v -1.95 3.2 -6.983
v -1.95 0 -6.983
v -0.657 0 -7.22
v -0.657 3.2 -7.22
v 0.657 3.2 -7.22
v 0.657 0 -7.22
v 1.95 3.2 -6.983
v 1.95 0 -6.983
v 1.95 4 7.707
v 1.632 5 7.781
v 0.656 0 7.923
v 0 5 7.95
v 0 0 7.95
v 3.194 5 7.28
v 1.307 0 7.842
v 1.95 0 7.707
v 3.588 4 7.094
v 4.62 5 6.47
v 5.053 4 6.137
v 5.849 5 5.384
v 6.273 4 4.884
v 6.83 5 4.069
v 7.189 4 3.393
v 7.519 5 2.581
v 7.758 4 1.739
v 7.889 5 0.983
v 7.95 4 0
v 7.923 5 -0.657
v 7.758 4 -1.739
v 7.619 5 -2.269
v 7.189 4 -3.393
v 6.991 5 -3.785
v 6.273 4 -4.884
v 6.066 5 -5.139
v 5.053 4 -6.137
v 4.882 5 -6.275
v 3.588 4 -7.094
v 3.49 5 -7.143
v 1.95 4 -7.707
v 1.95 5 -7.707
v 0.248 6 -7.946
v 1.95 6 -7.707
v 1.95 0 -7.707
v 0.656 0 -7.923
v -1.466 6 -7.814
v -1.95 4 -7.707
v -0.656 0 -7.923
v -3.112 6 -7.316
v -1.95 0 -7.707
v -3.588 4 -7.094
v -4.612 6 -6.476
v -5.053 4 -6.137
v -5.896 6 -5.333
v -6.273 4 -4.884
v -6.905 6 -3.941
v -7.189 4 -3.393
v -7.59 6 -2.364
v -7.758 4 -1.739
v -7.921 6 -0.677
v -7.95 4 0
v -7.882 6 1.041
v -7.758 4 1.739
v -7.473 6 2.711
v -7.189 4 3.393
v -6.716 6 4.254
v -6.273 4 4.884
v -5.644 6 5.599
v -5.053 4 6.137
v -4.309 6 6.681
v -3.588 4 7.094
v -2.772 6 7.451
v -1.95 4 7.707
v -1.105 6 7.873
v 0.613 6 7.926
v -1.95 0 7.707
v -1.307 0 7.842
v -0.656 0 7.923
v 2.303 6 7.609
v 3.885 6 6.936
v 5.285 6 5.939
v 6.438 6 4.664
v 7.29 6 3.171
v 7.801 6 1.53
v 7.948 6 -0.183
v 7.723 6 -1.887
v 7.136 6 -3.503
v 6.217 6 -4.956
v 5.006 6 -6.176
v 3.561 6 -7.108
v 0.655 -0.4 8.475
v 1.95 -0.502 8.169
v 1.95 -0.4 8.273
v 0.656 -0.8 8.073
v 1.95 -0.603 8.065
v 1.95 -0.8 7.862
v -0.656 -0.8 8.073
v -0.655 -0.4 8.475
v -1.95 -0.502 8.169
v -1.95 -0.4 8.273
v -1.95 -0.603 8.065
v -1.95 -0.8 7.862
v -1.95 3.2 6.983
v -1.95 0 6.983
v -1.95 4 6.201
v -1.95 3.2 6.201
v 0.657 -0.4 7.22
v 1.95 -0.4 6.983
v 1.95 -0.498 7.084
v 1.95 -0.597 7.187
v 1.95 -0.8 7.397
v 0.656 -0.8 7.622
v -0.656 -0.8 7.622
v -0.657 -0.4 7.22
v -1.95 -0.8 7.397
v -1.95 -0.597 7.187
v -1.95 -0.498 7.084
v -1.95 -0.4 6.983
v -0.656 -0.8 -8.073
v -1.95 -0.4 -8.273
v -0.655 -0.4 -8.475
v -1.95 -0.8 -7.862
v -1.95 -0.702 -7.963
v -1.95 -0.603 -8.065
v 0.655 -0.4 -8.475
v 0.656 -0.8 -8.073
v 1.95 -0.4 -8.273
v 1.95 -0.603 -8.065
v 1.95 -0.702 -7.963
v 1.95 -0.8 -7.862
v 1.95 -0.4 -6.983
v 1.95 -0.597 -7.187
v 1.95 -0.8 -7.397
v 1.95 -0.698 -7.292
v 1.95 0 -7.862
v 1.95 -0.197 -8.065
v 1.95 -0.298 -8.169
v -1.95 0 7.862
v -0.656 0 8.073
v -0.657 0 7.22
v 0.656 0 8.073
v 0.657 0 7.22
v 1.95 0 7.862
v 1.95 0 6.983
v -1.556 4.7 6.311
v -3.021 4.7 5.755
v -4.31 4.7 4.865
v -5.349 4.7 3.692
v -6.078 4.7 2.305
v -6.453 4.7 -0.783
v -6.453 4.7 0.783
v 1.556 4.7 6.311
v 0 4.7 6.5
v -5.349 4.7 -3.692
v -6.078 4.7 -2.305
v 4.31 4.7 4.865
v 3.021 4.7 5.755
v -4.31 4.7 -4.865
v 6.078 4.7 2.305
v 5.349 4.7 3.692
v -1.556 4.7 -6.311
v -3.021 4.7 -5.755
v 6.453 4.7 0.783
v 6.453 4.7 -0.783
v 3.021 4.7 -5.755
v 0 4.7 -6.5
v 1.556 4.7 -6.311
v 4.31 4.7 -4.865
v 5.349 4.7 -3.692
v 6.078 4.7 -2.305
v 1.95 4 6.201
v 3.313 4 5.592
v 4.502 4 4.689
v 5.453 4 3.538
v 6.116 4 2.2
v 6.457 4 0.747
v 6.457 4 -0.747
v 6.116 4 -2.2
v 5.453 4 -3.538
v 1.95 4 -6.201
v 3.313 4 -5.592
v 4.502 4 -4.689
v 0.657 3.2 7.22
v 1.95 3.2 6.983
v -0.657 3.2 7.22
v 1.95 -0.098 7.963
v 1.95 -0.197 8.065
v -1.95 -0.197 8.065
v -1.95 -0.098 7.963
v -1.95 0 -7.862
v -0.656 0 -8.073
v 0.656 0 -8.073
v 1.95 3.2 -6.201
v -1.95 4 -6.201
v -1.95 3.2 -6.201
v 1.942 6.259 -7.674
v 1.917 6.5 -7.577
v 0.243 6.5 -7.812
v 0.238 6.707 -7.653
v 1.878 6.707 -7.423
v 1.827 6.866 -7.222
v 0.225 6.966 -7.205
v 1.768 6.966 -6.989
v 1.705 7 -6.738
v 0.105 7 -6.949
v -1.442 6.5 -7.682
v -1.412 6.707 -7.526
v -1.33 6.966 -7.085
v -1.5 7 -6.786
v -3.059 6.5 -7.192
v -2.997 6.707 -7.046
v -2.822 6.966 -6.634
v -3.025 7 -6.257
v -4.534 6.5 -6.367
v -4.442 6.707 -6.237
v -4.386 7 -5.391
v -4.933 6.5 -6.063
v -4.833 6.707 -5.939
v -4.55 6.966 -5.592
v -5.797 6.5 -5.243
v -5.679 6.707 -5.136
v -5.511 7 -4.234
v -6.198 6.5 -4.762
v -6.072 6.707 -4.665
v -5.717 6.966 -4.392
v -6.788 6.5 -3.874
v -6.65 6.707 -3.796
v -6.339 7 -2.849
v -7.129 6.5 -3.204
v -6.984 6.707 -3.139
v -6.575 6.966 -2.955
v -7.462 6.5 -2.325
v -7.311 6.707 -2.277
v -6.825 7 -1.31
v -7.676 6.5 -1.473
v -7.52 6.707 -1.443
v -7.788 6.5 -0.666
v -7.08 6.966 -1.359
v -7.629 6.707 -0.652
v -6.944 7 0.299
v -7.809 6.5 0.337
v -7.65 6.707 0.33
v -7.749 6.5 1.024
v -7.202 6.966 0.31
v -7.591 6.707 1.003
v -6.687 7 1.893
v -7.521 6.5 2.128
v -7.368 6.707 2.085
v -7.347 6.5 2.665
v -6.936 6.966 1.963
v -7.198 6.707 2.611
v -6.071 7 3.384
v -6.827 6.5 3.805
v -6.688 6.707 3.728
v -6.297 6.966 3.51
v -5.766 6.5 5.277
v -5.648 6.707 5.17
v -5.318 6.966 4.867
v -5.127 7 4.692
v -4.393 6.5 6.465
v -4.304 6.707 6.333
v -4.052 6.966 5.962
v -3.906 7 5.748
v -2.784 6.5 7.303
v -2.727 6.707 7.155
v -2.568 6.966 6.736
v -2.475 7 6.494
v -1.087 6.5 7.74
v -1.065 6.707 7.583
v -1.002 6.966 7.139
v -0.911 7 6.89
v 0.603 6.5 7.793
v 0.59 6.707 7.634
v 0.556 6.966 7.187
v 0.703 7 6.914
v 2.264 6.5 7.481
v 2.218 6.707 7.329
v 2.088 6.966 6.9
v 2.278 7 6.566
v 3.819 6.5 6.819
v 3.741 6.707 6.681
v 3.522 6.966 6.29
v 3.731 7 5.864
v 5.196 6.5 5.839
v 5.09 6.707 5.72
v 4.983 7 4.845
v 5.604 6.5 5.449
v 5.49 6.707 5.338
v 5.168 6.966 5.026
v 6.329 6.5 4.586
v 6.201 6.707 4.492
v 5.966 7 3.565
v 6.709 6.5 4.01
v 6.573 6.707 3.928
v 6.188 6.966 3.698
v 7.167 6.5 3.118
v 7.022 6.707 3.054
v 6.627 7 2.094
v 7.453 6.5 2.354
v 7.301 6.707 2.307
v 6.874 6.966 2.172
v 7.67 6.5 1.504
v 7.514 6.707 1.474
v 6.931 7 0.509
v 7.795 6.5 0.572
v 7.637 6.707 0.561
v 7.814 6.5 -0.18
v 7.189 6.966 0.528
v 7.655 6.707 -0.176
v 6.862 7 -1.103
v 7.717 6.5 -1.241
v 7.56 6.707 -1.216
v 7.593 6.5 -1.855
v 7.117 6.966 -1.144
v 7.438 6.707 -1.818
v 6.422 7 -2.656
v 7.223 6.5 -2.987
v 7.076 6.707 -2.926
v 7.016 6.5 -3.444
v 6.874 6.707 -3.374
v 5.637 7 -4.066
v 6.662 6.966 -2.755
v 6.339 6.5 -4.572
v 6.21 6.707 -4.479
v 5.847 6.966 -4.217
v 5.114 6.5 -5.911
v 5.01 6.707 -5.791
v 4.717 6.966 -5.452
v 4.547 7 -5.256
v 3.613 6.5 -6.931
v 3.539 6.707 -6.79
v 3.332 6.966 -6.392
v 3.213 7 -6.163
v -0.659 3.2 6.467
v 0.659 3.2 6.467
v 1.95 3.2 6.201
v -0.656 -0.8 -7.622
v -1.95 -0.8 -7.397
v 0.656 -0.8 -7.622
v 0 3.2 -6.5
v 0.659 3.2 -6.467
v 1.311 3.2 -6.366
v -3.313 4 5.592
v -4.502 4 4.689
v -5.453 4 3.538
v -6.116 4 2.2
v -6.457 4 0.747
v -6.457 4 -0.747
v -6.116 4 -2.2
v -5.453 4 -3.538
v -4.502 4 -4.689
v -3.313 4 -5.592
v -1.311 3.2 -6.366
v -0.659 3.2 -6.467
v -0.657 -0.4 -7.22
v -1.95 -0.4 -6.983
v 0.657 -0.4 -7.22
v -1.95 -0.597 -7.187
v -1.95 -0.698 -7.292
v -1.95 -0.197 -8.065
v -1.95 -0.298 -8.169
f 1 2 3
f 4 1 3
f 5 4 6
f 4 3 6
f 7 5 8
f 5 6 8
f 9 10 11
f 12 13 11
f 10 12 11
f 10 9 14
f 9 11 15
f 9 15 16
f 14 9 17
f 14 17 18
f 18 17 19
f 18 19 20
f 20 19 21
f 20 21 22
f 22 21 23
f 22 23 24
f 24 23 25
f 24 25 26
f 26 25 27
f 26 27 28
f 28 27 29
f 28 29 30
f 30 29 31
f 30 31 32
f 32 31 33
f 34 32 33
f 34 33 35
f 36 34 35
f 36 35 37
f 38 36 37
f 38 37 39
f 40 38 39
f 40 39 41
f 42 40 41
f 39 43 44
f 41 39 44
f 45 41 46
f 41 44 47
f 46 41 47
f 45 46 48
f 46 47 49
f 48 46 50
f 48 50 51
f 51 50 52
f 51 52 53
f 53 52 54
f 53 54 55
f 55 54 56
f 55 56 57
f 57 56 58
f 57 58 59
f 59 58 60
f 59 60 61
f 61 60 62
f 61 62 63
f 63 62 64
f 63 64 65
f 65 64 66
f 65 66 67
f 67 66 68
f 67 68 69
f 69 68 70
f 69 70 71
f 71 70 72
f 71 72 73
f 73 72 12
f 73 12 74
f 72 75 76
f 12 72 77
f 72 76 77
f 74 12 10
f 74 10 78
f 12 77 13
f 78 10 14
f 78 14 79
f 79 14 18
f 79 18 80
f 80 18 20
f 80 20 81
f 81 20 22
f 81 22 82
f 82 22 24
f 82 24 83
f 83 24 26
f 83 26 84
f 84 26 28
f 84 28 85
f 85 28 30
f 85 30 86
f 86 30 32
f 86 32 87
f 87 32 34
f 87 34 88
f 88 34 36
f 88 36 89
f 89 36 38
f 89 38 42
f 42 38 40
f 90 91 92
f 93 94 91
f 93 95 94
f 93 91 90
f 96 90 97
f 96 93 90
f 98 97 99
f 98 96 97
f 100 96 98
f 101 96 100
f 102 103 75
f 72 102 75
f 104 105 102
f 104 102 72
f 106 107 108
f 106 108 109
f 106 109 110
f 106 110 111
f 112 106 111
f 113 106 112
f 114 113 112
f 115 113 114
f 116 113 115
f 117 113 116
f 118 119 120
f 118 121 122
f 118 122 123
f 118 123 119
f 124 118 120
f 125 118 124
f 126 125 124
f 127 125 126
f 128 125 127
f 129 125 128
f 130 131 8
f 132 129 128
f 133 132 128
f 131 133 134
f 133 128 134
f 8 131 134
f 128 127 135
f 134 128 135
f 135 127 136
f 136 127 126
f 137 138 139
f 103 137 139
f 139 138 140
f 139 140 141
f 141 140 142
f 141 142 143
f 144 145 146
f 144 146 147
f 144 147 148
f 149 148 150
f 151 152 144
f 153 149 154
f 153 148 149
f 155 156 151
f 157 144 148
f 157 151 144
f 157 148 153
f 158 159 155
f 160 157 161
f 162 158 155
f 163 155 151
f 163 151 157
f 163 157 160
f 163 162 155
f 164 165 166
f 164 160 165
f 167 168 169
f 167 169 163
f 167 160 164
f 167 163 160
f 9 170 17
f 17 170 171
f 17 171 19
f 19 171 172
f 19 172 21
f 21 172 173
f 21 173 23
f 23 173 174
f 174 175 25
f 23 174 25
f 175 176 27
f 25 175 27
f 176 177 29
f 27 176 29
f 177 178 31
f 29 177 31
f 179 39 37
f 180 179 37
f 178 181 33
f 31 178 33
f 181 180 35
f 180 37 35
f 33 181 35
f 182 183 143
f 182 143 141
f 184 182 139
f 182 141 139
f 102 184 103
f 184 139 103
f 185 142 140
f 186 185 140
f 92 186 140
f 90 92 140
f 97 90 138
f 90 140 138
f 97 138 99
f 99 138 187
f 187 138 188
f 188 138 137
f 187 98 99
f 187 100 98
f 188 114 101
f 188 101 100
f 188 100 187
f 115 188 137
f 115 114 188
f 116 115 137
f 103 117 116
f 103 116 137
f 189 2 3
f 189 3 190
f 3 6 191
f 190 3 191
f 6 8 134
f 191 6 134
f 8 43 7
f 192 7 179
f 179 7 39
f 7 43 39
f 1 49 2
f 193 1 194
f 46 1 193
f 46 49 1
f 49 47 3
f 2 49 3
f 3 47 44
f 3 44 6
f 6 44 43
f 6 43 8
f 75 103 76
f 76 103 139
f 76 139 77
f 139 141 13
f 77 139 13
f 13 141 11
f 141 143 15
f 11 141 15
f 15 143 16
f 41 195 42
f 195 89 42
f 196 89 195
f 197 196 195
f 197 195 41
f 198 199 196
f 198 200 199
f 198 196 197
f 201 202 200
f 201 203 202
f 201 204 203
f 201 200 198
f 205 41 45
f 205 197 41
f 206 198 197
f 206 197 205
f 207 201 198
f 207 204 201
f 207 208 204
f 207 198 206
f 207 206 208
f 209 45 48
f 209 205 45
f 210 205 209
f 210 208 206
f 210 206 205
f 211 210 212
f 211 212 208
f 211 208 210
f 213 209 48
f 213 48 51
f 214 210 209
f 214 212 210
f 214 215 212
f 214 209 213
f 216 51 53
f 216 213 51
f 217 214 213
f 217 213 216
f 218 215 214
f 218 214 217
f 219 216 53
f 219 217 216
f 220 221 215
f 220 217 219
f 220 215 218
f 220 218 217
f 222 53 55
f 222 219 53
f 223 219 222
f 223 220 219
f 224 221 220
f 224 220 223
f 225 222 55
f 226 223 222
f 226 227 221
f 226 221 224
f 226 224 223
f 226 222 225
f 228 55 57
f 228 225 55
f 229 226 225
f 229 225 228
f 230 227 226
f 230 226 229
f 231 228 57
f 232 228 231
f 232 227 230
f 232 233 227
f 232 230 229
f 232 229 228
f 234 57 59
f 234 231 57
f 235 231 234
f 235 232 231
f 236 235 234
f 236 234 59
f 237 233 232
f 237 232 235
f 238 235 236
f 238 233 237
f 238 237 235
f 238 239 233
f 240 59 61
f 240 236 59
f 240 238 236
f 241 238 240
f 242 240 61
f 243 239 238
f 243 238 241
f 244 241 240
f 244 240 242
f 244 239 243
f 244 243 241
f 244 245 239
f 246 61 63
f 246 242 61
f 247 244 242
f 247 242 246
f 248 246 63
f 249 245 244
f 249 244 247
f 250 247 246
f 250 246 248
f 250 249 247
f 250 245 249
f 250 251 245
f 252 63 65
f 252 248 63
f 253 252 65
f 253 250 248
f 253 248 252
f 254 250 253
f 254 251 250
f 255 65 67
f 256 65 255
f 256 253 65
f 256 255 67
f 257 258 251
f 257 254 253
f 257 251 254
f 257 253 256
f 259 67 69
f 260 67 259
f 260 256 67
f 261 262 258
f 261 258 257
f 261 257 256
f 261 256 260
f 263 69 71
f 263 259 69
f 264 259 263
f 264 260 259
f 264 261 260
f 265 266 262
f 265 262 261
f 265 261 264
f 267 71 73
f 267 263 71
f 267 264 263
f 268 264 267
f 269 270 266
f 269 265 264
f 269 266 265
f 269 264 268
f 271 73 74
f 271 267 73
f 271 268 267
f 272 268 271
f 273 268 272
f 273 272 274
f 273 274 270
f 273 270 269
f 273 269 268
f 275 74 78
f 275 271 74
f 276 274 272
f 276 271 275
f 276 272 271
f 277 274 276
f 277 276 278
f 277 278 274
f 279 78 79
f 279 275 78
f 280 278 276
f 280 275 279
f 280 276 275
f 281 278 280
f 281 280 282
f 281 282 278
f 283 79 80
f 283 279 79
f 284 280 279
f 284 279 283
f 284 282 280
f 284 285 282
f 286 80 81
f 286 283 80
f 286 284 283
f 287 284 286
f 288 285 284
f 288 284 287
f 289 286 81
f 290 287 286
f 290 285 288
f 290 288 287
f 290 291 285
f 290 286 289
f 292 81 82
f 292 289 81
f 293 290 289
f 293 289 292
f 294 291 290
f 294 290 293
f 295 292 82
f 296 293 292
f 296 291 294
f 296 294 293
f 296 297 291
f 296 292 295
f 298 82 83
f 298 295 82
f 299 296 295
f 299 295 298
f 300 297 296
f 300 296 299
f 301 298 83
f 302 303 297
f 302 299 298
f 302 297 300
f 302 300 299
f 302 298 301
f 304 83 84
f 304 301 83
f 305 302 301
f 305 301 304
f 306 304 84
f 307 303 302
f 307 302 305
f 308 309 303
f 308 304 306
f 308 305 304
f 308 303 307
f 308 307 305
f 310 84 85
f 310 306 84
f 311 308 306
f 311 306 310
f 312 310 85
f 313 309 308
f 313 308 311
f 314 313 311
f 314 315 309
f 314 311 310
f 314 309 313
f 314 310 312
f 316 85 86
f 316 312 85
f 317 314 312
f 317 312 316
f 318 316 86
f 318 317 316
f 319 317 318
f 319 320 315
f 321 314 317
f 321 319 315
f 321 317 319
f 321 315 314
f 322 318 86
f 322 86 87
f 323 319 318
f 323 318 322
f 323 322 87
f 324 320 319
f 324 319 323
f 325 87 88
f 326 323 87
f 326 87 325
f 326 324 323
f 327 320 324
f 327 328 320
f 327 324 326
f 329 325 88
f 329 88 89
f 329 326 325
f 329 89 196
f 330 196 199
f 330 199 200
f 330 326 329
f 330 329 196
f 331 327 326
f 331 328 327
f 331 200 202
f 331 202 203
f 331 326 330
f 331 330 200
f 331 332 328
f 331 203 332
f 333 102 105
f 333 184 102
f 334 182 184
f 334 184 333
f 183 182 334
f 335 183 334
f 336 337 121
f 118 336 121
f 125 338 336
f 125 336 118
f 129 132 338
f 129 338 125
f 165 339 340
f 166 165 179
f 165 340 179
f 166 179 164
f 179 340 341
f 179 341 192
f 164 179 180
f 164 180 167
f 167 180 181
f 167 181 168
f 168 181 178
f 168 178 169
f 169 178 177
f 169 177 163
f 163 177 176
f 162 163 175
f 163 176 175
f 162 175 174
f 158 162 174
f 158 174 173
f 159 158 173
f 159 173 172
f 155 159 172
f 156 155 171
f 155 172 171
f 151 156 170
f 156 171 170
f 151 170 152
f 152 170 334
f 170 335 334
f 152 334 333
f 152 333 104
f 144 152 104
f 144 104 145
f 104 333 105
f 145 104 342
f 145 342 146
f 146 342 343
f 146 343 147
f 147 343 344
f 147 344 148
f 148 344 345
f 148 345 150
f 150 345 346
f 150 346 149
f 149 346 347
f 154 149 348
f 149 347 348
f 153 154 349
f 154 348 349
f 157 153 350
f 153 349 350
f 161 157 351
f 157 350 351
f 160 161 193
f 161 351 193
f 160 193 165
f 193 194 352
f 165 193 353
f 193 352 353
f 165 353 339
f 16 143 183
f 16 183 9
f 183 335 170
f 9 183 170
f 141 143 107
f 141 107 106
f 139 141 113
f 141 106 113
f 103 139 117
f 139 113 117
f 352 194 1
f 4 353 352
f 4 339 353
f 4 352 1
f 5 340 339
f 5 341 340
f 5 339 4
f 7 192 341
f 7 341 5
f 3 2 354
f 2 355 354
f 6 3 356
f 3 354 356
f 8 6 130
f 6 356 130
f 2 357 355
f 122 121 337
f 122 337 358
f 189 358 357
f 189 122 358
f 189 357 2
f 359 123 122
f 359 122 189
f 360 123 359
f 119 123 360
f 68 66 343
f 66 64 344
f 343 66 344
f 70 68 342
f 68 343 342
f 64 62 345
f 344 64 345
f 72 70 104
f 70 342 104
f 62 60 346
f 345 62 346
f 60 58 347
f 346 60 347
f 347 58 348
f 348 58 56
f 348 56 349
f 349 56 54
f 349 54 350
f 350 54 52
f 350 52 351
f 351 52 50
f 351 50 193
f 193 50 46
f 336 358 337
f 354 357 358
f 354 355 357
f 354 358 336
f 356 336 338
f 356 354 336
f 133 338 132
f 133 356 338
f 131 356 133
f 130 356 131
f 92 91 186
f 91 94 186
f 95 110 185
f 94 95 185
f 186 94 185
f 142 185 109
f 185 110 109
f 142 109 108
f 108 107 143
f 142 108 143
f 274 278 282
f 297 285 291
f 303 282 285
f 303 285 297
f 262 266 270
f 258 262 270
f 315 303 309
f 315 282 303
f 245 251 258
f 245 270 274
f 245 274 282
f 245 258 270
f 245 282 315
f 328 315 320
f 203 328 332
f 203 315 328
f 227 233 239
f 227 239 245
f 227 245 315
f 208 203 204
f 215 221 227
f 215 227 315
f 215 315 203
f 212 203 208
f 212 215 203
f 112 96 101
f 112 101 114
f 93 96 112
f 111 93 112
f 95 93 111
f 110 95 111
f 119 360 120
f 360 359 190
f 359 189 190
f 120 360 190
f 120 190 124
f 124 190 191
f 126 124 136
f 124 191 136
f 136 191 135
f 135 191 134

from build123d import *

# Parameters (mm, degrees)
SKETCH_2_R               = 7.95
EXTRUDE_1_DEPTH          = 5
SKETCH_4_R               = 8.5
EXTRUDE_2_DEPTH          = 0.8
SKETCH_3_R               = 7.25
CUT_EXTRUDE_2_DEPTH      = 4
CHAMFER_2_SIZE           = 0.4
CUT_EXTRUDE_3_DEPTH      = 14.019216566
CUT_EXTRUDE_3_DEPTH_BACK = 14.019216566
SKETCH_5_W               = 6
SKETCH_5_H               = 8
SKETCH_6_R               = 7.95
EXTRUDE_3_DEPTH          = 2
FILLET_1_R               = 1
SKETCH_7_R               = 6.5
CUT_EXTRUDE_4_DEPTH      = 1.5
CUT_EXTRUDE_8_DEPTH      = 14.910427743
CUT_EXTRUDE_8_DEPTH_BACK = 14.910427743
SKETCH_9_W               = 2.014745723
SKETCH_9_H               = 2.313226571
SKETCH_9_W_2             = 1.942835104
SKETCH_9_H_2             = 2.895732504


with BuildPart() as part:
    # 草图2 → 凸台-拉伸1 (new body)
    with BuildSketch(Plane(origin=(0, 0, 0), x_dir=(1, 0, 0), z_dir=(0, 1, 0))):
        with Locations(Location((0, 0, 0), (0, 0, 270))):
            Circle(SKETCH_2_R)
    extrude(amount=EXTRUDE_1_DEPTH)


with BuildPart() as body_2:
    # 草图4 → 凸台-拉伸2 (new body)
    with BuildSketch(Plane.XZ):
        with Locations(Location((0, 0, 0), (0, 0, 270))):
            Circle(SKETCH_4_R)
    extrude(amount=EXTRUDE_2_DEPTH)


with BuildPart() as cut_extrude_2_tool:
    # 草图3 → 切除-拉伸2 (new body)
    with BuildSketch(Plane.XZ.offset(0.8)):
        with Locations(Location((0, 0, 0), (0, 0, 270))):
            Circle(SKETCH_3_R)
    extrude(amount=-CUT_EXTRUDE_2_DEPTH)


with BuildPart() as part_1:
    add(part.part)

    # 切除-拉伸2: cut by cut_extrude_2_tool
    add(cut_extrude_2_tool.part, mode=Mode.SUBTRACT)


with BuildPart() as body_2_1:
    add(body_2.part)

    # 切除-拉伸2: cut by cut_extrude_2_tool
    add(cut_extrude_2_tool.part, mode=Mode.SUBTRACT)

    # 倒角2
    # the kernel refuses this chamfer: 0.4 mm, written as the material it takes off along each edge
    with BuildSketch(Plane(origin=(0, 0, 0), x_dir=(0, 0, -1), z_dir=(-1, 0, 0))) as chamfer_2_piece_1:
        Polygon((8.5, CHAMFER_2_SIZE), (8.5 - CHAMFER_2_SIZE, 0), (8.5, 0), align=None)
    revolve(axis=Axis((0, 0, 0), (0, -1, 0)), mode=Mode.SUBTRACT)
    with BuildSketch(Plane(origin=(0, -0.8, 0), x_dir=(0, 0, -1), z_dir=(-1, 0, 0))) as chamfer_2_piece_2:
        Polygon((8.5, -CHAMFER_2_SIZE), (8.5 - CHAMFER_2_SIZE, 0), (8.5, 0), align=None)
    revolve(axis=Axis((0, -0.8, 0), (0, -1, 0)), mode=Mode.SUBTRACT)
    with BuildSketch(Plane(origin=(0, -0.8, 0), x_dir=(0, 0, -1), z_dir=(-1, 0, 0))) as chamfer_2_piece_3:
        Polygon((7.25 + CHAMFER_2_SIZE, 0), (7.25, -CHAMFER_2_SIZE), (7.25, 0), align=None)
    revolve(axis=Axis((0, -0.8, 0), (0, -1, 0)), mode=Mode.SUBTRACT)


with BuildPart() as cut_extrude_3_tool:
    # 草图5 → 切除-拉伸3 (new, two sides: drawn at the far end of the back side and taken through both)
    with BuildSketch(Plane.XY.offset(-CUT_EXTRUDE_3_DEPTH_BACK)):
        with Locations((-4.95, 0)):
            Rectangle(SKETCH_5_W, SKETCH_5_H)
        with Locations((4.95, 0)):
            Rectangle(SKETCH_5_W, SKETCH_5_H)
    extrude(amount=CUT_EXTRUDE_3_DEPTH + CUT_EXTRUDE_3_DEPTH_BACK)


with BuildPart() as part_2:
    add(part_1.part)

    # 切除-拉伸3: cut by cut_extrude_3_tool
    add(cut_extrude_3_tool.part, mode=Mode.SUBTRACT)

    # 草图6 → 凸台-拉伸3 (add)
    with BuildSketch(Plane(origin=(0, 5, 0), x_dir=(1, 0, 0), z_dir=(0, 1, 0))):
        with Locations(Location((0, 0, 0), (0, 0, 75.801440125))):
            Circle(SKETCH_6_R)
    extrude(amount=EXTRUDE_3_DEPTH)

    # 圆角1
    fillet_1_edges = [part_2.edges().sort_by_distance(p)[0] for p in [
        (-1.95, 7, 7.707139547),
    ]]
    fillet(fillet_1_edges, radius=FILLET_1_R)

    # 草图7 → 切除-拉伸4 (cut)
    with BuildSketch(Plane.XZ.offset(-3.2)):
        with Locations(Location((0, 0, 0), (0, 0, 270))):
            Circle(SKETCH_7_R)
    extrude(amount=-CUT_EXTRUDE_4_DEPTH, mode=Mode.SUBTRACT)


with BuildPart() as body_2_2:
    add(body_2_1.part)

    # 切除-拉伸3: cut by cut_extrude_3_tool
    add(cut_extrude_3_tool.part, mode=Mode.SUBTRACT)

    # 草图9 → 切除-拉伸8 (cut, two sides: drawn at the far end of the back side and taken through both)
    with BuildSketch(Plane.XY.offset(-CUT_EXTRUDE_8_DEPTH_BACK)):
        with Locations((-8.140610587, -0.399654316)):
            Rectangle(SKETCH_9_W, SKETCH_9_H)
        with Locations((7.842413689, -0.690907284)):
            Rectangle(SKETCH_9_W_2, SKETCH_9_H_2)
    extrude(amount=CUT_EXTRUDE_8_DEPTH + CUT_EXTRUDE_8_DEPTH_BACK, mode=Mode.SUBTRACT)


solid = Compound([part_2.part, body_2_2.part])
